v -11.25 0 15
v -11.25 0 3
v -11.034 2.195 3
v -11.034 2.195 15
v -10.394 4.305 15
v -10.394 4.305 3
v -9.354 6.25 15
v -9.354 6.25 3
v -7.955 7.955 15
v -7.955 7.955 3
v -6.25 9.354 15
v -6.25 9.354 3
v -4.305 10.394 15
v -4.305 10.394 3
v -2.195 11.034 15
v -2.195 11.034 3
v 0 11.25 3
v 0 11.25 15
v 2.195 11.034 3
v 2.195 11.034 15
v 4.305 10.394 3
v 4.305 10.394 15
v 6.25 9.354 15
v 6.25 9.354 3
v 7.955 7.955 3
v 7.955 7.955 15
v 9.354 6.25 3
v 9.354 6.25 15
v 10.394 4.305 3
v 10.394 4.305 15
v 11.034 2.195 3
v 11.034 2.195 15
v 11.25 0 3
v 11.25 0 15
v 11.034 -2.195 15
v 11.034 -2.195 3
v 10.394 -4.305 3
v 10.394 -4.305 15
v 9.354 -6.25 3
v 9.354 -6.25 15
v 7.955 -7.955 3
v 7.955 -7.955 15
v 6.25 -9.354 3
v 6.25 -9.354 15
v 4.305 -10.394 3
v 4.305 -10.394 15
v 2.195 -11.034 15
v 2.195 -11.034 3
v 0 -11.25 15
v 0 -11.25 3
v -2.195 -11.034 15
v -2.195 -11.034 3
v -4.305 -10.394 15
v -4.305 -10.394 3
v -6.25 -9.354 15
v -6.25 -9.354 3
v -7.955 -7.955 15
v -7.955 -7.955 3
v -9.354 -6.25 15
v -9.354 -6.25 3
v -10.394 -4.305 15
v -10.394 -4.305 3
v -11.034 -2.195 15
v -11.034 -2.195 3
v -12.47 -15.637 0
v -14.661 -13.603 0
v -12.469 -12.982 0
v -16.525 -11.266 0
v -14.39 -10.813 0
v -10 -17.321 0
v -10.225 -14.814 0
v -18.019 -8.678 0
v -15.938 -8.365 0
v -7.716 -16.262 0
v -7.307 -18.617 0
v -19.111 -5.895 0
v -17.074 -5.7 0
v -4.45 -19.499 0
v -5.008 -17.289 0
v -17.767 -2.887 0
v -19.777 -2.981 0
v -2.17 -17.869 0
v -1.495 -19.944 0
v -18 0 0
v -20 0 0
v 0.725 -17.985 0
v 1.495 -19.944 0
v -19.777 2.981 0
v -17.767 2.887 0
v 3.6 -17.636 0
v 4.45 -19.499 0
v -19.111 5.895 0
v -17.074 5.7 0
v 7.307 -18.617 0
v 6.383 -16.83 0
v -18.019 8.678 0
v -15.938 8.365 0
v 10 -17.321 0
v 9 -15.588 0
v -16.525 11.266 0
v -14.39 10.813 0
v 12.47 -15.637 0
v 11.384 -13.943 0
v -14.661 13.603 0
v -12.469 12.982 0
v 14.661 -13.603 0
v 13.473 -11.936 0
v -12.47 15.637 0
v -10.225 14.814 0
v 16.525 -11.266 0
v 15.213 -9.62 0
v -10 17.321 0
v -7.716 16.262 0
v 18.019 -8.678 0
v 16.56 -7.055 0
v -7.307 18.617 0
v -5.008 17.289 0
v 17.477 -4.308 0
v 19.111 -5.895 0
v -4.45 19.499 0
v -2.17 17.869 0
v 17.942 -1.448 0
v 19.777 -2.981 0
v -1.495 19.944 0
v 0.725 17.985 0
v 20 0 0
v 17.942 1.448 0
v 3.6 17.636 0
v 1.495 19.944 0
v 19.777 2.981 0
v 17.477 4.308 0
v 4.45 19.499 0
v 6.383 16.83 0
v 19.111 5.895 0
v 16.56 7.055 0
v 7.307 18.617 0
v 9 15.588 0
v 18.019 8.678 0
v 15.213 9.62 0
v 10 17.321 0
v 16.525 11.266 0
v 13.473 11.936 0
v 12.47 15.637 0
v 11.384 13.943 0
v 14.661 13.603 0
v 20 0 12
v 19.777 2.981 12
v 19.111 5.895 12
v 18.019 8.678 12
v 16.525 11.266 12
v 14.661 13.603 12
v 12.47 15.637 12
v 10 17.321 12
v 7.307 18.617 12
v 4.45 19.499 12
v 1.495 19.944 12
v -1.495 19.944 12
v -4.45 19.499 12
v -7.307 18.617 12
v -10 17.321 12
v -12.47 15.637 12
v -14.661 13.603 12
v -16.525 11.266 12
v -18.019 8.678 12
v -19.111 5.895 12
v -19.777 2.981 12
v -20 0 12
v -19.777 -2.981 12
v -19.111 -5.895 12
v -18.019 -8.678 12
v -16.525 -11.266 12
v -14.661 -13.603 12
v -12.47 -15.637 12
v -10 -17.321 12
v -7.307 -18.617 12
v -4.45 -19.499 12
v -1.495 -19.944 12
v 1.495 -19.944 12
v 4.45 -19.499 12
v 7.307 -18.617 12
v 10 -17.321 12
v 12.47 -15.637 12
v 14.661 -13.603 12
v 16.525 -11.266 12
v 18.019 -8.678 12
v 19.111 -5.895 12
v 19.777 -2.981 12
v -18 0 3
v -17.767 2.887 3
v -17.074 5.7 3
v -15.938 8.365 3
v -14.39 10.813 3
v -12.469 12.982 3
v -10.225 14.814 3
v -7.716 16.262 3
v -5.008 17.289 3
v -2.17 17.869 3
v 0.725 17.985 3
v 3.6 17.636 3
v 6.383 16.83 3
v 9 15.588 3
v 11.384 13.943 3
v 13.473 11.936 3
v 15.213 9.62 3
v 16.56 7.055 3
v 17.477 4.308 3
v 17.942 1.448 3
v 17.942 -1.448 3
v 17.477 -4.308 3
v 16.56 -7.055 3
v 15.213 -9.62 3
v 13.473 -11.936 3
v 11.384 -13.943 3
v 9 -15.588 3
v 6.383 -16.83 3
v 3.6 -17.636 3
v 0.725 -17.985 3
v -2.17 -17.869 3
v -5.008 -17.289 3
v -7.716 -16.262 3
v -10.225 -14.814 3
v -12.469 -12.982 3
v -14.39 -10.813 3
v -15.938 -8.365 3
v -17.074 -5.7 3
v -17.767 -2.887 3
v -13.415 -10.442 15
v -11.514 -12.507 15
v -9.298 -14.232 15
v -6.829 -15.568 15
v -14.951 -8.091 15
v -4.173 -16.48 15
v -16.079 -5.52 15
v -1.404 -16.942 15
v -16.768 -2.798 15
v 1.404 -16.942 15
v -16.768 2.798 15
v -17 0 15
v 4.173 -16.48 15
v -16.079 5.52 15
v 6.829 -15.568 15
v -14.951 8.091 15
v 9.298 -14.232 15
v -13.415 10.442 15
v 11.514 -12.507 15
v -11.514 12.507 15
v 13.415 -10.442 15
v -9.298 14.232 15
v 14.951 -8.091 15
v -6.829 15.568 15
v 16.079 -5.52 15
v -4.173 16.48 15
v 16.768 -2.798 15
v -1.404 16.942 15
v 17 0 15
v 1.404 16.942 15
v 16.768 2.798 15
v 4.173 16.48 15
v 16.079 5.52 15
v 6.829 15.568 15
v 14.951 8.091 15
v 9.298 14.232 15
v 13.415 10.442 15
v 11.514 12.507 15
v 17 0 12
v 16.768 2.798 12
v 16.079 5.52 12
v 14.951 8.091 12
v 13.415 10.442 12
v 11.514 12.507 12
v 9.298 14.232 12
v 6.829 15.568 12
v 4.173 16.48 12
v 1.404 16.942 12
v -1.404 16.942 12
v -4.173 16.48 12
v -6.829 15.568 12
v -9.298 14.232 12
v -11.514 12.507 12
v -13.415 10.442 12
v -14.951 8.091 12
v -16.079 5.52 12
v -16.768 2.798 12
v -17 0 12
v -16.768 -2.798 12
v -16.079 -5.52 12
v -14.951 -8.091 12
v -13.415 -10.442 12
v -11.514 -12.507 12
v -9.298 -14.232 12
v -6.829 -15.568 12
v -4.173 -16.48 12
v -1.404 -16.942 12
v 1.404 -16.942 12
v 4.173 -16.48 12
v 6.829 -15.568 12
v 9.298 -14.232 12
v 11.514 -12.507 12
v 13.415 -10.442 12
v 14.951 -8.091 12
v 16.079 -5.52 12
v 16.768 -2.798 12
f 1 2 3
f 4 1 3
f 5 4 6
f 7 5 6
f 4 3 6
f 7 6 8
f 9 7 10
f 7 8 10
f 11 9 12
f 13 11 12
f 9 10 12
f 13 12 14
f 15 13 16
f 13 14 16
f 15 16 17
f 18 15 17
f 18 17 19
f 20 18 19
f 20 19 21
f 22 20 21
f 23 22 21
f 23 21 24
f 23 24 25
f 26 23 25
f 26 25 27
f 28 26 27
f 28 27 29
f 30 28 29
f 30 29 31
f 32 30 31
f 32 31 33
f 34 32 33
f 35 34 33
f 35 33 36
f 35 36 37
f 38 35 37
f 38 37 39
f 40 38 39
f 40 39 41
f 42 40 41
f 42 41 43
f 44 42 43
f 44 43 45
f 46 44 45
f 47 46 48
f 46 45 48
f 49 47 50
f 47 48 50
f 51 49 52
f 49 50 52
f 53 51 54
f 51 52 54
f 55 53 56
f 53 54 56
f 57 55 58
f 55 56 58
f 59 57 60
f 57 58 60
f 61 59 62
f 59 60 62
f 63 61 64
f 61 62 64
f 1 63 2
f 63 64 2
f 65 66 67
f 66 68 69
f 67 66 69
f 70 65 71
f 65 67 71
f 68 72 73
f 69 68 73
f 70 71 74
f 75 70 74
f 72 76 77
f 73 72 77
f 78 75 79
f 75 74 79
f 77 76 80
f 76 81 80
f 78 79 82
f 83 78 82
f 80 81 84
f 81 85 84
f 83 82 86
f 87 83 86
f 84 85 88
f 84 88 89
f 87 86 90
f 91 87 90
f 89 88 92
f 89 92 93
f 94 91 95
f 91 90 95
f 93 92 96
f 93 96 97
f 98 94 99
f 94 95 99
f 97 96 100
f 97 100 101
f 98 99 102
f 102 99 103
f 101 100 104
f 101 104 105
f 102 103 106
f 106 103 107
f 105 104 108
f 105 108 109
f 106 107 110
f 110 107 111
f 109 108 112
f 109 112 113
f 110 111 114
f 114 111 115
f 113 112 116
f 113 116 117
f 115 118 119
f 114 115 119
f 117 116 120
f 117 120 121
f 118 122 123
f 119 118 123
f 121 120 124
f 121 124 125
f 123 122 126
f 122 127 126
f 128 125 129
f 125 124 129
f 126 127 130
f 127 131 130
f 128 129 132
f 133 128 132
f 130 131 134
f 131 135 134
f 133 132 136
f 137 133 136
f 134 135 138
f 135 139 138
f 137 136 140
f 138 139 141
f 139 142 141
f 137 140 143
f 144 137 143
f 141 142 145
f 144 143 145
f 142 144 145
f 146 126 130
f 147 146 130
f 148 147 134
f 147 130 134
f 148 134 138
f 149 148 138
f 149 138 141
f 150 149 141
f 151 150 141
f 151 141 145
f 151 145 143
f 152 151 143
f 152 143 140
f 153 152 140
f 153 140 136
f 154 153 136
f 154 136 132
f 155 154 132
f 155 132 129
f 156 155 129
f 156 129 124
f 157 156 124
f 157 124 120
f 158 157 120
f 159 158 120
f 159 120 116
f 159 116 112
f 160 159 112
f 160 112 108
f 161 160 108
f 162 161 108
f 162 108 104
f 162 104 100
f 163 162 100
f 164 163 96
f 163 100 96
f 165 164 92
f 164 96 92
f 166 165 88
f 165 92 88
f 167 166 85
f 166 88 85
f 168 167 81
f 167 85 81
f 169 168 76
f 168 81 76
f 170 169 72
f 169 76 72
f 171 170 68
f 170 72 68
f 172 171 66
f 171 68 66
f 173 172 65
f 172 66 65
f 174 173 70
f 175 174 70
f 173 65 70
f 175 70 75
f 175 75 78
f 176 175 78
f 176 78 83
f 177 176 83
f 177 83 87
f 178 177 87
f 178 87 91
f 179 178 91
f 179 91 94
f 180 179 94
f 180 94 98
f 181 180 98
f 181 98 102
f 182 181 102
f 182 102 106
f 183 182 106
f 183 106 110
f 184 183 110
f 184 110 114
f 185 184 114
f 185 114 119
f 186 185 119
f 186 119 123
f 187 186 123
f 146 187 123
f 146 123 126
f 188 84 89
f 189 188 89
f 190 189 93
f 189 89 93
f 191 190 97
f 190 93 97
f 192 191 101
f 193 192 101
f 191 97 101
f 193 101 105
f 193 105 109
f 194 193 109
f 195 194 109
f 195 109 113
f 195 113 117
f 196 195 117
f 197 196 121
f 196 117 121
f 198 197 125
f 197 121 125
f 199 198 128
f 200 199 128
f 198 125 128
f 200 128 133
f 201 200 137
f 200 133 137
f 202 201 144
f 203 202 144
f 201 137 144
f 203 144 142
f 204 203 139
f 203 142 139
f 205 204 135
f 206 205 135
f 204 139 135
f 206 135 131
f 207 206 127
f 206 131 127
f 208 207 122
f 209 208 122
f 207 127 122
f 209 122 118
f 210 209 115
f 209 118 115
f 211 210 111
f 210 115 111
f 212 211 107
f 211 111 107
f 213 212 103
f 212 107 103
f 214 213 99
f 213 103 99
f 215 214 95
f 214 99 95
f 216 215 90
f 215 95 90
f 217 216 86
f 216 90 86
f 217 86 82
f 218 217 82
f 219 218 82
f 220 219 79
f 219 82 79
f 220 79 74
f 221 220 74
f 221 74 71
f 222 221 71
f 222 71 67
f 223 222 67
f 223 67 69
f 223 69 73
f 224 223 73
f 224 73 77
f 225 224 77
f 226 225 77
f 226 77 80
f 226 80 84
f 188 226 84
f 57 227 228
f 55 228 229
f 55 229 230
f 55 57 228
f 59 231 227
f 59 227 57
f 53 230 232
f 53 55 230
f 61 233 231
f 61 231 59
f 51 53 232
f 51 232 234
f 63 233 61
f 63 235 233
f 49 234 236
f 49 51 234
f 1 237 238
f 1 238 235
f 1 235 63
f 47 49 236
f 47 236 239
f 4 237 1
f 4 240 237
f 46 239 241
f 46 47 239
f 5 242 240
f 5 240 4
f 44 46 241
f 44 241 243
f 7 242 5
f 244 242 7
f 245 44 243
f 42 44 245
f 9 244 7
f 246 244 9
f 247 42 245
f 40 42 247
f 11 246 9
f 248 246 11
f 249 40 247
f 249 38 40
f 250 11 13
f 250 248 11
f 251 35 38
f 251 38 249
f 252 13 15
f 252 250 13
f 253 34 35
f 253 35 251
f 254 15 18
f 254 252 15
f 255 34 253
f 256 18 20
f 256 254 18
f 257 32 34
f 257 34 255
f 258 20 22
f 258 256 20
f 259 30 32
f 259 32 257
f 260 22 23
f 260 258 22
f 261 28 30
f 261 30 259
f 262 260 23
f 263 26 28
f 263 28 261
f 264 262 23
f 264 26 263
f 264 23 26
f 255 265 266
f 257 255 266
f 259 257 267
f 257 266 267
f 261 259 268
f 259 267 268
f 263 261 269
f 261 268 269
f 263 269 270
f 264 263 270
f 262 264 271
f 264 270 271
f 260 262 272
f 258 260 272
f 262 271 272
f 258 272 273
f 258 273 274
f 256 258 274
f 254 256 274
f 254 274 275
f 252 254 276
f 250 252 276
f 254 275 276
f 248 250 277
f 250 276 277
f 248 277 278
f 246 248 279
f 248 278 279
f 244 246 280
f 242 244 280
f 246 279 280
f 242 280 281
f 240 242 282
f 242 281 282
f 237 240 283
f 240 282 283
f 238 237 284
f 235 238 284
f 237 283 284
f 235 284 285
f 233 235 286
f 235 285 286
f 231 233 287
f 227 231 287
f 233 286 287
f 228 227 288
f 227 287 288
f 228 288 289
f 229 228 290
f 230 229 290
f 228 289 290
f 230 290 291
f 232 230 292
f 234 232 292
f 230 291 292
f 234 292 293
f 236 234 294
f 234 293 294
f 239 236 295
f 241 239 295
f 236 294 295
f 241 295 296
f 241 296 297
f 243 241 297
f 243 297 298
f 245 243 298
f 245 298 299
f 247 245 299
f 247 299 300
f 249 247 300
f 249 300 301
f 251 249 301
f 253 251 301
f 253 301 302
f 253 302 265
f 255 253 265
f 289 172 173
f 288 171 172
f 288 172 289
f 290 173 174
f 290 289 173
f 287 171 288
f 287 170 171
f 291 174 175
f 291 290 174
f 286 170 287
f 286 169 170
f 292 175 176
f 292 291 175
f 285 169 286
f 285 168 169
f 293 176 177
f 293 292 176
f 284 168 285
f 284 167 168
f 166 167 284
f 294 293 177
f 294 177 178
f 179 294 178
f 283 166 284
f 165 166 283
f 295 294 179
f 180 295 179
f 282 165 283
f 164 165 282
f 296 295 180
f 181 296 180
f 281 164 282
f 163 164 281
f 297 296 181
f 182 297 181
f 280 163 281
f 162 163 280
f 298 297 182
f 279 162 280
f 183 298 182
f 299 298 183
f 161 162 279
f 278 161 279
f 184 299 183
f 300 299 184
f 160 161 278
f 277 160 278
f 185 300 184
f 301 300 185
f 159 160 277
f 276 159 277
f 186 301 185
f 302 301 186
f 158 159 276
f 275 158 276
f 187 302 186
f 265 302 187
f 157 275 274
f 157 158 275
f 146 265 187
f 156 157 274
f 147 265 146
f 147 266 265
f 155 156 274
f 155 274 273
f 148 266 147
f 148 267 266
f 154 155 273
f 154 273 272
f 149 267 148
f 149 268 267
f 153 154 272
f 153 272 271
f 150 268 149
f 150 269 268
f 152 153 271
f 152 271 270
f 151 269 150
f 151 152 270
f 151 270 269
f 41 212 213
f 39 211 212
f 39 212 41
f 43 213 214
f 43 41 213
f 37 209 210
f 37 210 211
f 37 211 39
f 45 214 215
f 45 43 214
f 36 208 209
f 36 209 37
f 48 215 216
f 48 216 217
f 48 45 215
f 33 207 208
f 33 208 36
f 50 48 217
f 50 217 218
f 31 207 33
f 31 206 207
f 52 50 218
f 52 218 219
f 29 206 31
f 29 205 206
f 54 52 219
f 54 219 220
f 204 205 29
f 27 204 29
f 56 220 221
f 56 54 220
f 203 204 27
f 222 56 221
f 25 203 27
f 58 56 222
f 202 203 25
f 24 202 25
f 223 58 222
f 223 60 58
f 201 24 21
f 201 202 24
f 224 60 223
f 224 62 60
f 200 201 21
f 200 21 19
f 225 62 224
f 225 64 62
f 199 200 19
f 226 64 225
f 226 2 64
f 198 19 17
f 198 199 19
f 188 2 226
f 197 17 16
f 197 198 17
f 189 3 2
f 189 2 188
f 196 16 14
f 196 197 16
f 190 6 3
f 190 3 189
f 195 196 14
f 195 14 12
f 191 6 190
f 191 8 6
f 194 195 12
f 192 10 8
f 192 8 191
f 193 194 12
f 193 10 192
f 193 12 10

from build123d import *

# Parameters (mm, degrees)
SKETCH_1_R          = 20
EXTRUDE_1_DEPTH     = 18
CUT_EXTRUDE_START   = -3
SKETCH_2_R          = 20
CUT_EXTRUDE_1_DEPTH = 3
SKETCH_5_R          = 20
SKETCH_5_R_2        = 17
CUT_EXTRUDE_4_DEPTH = 3
SKETCH_6_R          = 11.25
CUT_EXTRUDE_5_DEPTH = 50
SKETCH_7_R          = 18
CUT_EXTRUDE_6_DEPTH = 3


with BuildPart() as part:
    # 草图1 → 拉伸1 (new body)
    with BuildSketch(Plane.XY):
        Circle(SKETCH_1_R)
    extrude(amount=EXTRUDE_1_DEPTH)

    # 草图2 → 切除-拉伸1 (cut)
    with BuildSketch(Plane.XY.offset(18).offset(CUT_EXTRUDE_START)):
        Circle(SKETCH_2_R)
    extrude(amount=CUT_EXTRUDE_1_DEPTH, mode=Mode.SUBTRACT)

    # 草图5 → 切除-拉伸4 (cut)
    with BuildSketch(Plane.XY.offset(15).offset(CUT_EXTRUDE_START)):
        Circle(SKETCH_5_R)
        Circle(SKETCH_5_R_2, mode=Mode.SUBTRACT)
    extrude(amount=CUT_EXTRUDE_4_DEPTH, mode=Mode.SUBTRACT)

    # 草图6 → 切除-拉伸5 (cut)
    with BuildSketch(Plane(origin=(0, 0, 0), x_dir=(-1, 0, 0), z_dir=(0, 0, -1))):
        Circle(SKETCH_6_R)
    extrude(amount=-CUT_EXTRUDE_5_DEPTH, mode=Mode.SUBTRACT)

    # 草图7 → 切除-拉伸6 (cut)
    with BuildSketch(Plane(origin=(0, 0, 0), x_dir=(-1, 0, 0), z_dir=(0, 0, -1))):
        Circle(SKETCH_7_R)
    extrude(amount=-CUT_EXTRUDE_6_DEPTH, mode=Mode.SUBTRACT)


solid = part.part
